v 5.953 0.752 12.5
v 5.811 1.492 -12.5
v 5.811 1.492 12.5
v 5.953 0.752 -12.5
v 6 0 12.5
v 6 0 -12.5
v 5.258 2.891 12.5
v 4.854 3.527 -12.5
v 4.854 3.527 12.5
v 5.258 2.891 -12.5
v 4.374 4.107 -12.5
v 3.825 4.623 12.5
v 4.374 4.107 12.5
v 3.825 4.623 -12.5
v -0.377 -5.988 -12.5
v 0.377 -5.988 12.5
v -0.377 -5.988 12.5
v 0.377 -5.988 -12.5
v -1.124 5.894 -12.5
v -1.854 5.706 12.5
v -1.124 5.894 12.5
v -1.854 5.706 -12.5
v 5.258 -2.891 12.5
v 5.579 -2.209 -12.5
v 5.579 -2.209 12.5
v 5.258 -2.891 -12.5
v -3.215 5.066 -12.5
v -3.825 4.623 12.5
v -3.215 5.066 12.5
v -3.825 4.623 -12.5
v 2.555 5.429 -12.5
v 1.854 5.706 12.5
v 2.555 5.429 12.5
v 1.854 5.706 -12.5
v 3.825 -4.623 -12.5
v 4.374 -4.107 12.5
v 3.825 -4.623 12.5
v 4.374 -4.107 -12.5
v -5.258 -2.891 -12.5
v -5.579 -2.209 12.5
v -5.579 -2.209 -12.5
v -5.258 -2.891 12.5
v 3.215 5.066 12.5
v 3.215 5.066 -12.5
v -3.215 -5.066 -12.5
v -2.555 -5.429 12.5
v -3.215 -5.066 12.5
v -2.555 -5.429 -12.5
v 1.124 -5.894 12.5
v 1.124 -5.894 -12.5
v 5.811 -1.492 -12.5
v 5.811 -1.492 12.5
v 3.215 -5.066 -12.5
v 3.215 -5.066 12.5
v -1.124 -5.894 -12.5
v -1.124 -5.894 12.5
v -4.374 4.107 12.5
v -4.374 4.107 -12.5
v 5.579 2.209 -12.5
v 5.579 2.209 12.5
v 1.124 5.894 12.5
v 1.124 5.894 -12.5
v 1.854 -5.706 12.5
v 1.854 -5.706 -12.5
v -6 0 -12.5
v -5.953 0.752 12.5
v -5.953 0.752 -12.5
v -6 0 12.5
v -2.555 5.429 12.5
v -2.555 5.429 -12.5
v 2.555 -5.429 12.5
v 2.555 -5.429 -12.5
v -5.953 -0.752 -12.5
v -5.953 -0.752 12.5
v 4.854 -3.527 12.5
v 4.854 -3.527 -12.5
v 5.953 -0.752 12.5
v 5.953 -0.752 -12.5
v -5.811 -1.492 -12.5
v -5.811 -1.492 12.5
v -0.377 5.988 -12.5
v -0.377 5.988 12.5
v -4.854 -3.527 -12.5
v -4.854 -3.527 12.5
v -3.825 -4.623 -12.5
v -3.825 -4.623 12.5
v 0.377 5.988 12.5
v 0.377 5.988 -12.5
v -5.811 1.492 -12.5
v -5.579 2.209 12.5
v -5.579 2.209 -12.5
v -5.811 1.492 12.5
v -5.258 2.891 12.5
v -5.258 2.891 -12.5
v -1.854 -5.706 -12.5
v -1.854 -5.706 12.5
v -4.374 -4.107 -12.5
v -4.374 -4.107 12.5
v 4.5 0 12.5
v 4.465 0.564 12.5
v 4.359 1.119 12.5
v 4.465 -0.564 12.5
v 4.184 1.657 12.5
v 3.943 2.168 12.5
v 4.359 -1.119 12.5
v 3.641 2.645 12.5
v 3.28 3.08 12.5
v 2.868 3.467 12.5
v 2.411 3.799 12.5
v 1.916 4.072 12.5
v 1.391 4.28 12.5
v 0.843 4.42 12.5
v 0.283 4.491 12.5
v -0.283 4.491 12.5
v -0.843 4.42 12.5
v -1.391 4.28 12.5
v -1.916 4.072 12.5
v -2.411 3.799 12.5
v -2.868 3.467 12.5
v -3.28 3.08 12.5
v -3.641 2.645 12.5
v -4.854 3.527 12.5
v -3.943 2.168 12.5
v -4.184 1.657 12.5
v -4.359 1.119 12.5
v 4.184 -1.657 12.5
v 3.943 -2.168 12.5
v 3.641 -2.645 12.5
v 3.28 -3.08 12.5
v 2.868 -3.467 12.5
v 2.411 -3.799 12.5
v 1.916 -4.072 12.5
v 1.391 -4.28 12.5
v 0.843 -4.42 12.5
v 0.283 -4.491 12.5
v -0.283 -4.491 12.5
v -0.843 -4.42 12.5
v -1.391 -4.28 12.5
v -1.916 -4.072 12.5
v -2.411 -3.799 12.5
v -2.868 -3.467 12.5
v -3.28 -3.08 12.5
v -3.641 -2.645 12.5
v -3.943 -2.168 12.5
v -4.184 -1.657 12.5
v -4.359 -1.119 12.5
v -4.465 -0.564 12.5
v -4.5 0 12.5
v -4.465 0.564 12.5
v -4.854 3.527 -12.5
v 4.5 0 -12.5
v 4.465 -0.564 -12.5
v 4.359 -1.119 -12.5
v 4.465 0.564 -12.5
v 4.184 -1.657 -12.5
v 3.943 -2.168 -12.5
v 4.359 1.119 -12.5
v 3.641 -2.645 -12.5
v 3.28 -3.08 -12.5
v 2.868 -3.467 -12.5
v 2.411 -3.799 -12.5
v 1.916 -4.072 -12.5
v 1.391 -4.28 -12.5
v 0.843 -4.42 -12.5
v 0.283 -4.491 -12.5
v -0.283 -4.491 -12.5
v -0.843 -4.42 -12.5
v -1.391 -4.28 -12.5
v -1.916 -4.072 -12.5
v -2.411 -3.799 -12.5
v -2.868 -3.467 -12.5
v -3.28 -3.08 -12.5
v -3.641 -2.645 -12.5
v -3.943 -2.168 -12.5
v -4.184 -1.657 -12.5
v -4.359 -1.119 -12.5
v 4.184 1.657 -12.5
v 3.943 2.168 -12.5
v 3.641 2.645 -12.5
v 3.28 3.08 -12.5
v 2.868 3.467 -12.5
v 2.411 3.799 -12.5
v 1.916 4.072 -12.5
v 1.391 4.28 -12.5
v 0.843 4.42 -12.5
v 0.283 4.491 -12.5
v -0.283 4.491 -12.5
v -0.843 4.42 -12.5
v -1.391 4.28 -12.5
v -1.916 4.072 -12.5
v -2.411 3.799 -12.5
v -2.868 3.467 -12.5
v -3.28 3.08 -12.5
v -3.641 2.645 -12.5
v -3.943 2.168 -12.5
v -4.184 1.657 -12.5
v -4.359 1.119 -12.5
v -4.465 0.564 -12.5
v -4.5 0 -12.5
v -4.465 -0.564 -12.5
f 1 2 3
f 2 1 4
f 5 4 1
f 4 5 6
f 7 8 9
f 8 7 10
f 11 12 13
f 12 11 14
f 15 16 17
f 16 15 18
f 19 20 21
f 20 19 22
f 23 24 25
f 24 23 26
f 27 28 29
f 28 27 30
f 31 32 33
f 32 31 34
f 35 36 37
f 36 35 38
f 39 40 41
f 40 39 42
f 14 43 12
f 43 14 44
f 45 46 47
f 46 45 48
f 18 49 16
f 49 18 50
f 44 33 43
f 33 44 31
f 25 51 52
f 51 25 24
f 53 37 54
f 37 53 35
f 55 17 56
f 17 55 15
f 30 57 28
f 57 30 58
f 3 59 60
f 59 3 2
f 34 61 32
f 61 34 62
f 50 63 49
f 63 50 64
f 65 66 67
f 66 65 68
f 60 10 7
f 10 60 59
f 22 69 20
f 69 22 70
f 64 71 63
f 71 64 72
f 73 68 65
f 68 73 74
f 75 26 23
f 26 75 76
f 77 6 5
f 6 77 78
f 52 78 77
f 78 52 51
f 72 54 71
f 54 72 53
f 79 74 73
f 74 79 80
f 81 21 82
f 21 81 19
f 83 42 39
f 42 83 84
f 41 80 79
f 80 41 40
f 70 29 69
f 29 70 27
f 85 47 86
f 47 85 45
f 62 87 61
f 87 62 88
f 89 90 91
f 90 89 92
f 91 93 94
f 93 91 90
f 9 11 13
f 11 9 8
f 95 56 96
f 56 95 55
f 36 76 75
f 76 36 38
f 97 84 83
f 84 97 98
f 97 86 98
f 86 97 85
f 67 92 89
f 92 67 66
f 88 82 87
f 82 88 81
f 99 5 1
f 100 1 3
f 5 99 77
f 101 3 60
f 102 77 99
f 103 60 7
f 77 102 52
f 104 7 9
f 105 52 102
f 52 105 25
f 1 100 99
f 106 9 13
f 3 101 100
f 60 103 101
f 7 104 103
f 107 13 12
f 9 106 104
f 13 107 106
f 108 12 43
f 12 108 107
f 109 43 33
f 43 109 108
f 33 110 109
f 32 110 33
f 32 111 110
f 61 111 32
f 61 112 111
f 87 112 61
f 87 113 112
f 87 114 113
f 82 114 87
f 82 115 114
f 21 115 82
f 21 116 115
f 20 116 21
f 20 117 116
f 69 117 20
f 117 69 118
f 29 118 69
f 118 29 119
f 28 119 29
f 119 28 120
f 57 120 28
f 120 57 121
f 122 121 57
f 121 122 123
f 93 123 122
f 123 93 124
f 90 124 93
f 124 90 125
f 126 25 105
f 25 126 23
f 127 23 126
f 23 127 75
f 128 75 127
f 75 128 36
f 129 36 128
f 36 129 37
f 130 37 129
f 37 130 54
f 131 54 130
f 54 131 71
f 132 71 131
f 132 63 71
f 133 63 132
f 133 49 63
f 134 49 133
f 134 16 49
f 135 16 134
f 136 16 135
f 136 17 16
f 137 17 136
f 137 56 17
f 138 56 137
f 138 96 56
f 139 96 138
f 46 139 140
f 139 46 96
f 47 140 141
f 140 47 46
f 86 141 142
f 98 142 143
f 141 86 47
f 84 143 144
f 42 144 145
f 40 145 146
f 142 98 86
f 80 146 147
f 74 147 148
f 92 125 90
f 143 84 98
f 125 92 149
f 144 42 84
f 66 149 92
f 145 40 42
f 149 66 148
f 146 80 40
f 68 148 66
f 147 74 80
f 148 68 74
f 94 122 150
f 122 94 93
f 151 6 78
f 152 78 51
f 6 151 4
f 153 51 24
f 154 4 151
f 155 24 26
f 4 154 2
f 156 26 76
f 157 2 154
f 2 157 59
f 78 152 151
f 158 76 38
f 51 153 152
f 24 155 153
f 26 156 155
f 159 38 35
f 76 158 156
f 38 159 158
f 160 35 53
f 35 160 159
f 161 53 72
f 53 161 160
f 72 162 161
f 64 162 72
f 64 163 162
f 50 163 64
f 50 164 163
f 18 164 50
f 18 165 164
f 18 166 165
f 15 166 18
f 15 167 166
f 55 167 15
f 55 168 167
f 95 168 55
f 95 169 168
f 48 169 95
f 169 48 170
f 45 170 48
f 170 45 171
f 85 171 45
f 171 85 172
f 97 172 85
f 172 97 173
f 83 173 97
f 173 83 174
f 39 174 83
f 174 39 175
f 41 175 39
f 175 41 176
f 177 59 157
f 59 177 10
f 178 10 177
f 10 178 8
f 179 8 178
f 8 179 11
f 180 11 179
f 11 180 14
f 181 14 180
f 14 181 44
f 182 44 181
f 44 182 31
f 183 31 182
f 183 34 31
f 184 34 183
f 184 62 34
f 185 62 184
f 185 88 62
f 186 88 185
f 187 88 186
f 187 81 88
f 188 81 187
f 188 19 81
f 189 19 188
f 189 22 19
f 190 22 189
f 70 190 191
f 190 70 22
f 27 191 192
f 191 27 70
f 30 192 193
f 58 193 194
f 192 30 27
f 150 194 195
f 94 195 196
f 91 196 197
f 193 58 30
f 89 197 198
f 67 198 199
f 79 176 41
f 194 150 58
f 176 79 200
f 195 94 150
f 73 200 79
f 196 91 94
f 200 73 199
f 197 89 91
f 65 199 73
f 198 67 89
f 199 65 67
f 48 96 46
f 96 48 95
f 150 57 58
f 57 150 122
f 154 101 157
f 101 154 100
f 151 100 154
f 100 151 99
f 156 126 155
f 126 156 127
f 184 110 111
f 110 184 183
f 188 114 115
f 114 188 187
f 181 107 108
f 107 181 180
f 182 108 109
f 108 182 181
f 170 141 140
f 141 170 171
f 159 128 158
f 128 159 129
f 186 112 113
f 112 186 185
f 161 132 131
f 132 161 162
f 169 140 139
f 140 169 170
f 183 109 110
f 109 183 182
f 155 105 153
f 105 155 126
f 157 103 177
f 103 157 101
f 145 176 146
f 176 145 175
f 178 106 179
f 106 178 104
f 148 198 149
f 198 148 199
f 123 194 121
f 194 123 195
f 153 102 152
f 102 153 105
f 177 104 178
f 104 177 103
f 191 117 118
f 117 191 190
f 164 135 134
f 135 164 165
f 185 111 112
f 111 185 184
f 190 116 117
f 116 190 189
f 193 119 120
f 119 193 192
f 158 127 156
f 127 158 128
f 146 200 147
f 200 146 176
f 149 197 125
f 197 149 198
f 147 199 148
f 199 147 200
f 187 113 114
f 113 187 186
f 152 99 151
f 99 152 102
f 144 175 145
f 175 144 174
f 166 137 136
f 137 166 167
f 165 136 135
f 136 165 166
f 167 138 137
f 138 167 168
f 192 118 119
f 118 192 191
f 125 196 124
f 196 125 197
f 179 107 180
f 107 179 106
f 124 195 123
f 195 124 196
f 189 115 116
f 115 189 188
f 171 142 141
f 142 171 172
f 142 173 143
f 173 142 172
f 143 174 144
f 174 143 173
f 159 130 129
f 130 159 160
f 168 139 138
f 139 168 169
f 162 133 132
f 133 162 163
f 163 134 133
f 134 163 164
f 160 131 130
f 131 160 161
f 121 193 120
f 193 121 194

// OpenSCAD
$fn = 50;


difference() {
	union() {
		translate(v = [0, 0, -12.5000000000]) {
			cylinder(h = 25, r = 6.0000000000);
		}
	}
	union() {
		translate(v = [0, 0, -100.0000000000]) {
			cylinder(h = 200, r = 4.5000000000);
		}
	}
}
